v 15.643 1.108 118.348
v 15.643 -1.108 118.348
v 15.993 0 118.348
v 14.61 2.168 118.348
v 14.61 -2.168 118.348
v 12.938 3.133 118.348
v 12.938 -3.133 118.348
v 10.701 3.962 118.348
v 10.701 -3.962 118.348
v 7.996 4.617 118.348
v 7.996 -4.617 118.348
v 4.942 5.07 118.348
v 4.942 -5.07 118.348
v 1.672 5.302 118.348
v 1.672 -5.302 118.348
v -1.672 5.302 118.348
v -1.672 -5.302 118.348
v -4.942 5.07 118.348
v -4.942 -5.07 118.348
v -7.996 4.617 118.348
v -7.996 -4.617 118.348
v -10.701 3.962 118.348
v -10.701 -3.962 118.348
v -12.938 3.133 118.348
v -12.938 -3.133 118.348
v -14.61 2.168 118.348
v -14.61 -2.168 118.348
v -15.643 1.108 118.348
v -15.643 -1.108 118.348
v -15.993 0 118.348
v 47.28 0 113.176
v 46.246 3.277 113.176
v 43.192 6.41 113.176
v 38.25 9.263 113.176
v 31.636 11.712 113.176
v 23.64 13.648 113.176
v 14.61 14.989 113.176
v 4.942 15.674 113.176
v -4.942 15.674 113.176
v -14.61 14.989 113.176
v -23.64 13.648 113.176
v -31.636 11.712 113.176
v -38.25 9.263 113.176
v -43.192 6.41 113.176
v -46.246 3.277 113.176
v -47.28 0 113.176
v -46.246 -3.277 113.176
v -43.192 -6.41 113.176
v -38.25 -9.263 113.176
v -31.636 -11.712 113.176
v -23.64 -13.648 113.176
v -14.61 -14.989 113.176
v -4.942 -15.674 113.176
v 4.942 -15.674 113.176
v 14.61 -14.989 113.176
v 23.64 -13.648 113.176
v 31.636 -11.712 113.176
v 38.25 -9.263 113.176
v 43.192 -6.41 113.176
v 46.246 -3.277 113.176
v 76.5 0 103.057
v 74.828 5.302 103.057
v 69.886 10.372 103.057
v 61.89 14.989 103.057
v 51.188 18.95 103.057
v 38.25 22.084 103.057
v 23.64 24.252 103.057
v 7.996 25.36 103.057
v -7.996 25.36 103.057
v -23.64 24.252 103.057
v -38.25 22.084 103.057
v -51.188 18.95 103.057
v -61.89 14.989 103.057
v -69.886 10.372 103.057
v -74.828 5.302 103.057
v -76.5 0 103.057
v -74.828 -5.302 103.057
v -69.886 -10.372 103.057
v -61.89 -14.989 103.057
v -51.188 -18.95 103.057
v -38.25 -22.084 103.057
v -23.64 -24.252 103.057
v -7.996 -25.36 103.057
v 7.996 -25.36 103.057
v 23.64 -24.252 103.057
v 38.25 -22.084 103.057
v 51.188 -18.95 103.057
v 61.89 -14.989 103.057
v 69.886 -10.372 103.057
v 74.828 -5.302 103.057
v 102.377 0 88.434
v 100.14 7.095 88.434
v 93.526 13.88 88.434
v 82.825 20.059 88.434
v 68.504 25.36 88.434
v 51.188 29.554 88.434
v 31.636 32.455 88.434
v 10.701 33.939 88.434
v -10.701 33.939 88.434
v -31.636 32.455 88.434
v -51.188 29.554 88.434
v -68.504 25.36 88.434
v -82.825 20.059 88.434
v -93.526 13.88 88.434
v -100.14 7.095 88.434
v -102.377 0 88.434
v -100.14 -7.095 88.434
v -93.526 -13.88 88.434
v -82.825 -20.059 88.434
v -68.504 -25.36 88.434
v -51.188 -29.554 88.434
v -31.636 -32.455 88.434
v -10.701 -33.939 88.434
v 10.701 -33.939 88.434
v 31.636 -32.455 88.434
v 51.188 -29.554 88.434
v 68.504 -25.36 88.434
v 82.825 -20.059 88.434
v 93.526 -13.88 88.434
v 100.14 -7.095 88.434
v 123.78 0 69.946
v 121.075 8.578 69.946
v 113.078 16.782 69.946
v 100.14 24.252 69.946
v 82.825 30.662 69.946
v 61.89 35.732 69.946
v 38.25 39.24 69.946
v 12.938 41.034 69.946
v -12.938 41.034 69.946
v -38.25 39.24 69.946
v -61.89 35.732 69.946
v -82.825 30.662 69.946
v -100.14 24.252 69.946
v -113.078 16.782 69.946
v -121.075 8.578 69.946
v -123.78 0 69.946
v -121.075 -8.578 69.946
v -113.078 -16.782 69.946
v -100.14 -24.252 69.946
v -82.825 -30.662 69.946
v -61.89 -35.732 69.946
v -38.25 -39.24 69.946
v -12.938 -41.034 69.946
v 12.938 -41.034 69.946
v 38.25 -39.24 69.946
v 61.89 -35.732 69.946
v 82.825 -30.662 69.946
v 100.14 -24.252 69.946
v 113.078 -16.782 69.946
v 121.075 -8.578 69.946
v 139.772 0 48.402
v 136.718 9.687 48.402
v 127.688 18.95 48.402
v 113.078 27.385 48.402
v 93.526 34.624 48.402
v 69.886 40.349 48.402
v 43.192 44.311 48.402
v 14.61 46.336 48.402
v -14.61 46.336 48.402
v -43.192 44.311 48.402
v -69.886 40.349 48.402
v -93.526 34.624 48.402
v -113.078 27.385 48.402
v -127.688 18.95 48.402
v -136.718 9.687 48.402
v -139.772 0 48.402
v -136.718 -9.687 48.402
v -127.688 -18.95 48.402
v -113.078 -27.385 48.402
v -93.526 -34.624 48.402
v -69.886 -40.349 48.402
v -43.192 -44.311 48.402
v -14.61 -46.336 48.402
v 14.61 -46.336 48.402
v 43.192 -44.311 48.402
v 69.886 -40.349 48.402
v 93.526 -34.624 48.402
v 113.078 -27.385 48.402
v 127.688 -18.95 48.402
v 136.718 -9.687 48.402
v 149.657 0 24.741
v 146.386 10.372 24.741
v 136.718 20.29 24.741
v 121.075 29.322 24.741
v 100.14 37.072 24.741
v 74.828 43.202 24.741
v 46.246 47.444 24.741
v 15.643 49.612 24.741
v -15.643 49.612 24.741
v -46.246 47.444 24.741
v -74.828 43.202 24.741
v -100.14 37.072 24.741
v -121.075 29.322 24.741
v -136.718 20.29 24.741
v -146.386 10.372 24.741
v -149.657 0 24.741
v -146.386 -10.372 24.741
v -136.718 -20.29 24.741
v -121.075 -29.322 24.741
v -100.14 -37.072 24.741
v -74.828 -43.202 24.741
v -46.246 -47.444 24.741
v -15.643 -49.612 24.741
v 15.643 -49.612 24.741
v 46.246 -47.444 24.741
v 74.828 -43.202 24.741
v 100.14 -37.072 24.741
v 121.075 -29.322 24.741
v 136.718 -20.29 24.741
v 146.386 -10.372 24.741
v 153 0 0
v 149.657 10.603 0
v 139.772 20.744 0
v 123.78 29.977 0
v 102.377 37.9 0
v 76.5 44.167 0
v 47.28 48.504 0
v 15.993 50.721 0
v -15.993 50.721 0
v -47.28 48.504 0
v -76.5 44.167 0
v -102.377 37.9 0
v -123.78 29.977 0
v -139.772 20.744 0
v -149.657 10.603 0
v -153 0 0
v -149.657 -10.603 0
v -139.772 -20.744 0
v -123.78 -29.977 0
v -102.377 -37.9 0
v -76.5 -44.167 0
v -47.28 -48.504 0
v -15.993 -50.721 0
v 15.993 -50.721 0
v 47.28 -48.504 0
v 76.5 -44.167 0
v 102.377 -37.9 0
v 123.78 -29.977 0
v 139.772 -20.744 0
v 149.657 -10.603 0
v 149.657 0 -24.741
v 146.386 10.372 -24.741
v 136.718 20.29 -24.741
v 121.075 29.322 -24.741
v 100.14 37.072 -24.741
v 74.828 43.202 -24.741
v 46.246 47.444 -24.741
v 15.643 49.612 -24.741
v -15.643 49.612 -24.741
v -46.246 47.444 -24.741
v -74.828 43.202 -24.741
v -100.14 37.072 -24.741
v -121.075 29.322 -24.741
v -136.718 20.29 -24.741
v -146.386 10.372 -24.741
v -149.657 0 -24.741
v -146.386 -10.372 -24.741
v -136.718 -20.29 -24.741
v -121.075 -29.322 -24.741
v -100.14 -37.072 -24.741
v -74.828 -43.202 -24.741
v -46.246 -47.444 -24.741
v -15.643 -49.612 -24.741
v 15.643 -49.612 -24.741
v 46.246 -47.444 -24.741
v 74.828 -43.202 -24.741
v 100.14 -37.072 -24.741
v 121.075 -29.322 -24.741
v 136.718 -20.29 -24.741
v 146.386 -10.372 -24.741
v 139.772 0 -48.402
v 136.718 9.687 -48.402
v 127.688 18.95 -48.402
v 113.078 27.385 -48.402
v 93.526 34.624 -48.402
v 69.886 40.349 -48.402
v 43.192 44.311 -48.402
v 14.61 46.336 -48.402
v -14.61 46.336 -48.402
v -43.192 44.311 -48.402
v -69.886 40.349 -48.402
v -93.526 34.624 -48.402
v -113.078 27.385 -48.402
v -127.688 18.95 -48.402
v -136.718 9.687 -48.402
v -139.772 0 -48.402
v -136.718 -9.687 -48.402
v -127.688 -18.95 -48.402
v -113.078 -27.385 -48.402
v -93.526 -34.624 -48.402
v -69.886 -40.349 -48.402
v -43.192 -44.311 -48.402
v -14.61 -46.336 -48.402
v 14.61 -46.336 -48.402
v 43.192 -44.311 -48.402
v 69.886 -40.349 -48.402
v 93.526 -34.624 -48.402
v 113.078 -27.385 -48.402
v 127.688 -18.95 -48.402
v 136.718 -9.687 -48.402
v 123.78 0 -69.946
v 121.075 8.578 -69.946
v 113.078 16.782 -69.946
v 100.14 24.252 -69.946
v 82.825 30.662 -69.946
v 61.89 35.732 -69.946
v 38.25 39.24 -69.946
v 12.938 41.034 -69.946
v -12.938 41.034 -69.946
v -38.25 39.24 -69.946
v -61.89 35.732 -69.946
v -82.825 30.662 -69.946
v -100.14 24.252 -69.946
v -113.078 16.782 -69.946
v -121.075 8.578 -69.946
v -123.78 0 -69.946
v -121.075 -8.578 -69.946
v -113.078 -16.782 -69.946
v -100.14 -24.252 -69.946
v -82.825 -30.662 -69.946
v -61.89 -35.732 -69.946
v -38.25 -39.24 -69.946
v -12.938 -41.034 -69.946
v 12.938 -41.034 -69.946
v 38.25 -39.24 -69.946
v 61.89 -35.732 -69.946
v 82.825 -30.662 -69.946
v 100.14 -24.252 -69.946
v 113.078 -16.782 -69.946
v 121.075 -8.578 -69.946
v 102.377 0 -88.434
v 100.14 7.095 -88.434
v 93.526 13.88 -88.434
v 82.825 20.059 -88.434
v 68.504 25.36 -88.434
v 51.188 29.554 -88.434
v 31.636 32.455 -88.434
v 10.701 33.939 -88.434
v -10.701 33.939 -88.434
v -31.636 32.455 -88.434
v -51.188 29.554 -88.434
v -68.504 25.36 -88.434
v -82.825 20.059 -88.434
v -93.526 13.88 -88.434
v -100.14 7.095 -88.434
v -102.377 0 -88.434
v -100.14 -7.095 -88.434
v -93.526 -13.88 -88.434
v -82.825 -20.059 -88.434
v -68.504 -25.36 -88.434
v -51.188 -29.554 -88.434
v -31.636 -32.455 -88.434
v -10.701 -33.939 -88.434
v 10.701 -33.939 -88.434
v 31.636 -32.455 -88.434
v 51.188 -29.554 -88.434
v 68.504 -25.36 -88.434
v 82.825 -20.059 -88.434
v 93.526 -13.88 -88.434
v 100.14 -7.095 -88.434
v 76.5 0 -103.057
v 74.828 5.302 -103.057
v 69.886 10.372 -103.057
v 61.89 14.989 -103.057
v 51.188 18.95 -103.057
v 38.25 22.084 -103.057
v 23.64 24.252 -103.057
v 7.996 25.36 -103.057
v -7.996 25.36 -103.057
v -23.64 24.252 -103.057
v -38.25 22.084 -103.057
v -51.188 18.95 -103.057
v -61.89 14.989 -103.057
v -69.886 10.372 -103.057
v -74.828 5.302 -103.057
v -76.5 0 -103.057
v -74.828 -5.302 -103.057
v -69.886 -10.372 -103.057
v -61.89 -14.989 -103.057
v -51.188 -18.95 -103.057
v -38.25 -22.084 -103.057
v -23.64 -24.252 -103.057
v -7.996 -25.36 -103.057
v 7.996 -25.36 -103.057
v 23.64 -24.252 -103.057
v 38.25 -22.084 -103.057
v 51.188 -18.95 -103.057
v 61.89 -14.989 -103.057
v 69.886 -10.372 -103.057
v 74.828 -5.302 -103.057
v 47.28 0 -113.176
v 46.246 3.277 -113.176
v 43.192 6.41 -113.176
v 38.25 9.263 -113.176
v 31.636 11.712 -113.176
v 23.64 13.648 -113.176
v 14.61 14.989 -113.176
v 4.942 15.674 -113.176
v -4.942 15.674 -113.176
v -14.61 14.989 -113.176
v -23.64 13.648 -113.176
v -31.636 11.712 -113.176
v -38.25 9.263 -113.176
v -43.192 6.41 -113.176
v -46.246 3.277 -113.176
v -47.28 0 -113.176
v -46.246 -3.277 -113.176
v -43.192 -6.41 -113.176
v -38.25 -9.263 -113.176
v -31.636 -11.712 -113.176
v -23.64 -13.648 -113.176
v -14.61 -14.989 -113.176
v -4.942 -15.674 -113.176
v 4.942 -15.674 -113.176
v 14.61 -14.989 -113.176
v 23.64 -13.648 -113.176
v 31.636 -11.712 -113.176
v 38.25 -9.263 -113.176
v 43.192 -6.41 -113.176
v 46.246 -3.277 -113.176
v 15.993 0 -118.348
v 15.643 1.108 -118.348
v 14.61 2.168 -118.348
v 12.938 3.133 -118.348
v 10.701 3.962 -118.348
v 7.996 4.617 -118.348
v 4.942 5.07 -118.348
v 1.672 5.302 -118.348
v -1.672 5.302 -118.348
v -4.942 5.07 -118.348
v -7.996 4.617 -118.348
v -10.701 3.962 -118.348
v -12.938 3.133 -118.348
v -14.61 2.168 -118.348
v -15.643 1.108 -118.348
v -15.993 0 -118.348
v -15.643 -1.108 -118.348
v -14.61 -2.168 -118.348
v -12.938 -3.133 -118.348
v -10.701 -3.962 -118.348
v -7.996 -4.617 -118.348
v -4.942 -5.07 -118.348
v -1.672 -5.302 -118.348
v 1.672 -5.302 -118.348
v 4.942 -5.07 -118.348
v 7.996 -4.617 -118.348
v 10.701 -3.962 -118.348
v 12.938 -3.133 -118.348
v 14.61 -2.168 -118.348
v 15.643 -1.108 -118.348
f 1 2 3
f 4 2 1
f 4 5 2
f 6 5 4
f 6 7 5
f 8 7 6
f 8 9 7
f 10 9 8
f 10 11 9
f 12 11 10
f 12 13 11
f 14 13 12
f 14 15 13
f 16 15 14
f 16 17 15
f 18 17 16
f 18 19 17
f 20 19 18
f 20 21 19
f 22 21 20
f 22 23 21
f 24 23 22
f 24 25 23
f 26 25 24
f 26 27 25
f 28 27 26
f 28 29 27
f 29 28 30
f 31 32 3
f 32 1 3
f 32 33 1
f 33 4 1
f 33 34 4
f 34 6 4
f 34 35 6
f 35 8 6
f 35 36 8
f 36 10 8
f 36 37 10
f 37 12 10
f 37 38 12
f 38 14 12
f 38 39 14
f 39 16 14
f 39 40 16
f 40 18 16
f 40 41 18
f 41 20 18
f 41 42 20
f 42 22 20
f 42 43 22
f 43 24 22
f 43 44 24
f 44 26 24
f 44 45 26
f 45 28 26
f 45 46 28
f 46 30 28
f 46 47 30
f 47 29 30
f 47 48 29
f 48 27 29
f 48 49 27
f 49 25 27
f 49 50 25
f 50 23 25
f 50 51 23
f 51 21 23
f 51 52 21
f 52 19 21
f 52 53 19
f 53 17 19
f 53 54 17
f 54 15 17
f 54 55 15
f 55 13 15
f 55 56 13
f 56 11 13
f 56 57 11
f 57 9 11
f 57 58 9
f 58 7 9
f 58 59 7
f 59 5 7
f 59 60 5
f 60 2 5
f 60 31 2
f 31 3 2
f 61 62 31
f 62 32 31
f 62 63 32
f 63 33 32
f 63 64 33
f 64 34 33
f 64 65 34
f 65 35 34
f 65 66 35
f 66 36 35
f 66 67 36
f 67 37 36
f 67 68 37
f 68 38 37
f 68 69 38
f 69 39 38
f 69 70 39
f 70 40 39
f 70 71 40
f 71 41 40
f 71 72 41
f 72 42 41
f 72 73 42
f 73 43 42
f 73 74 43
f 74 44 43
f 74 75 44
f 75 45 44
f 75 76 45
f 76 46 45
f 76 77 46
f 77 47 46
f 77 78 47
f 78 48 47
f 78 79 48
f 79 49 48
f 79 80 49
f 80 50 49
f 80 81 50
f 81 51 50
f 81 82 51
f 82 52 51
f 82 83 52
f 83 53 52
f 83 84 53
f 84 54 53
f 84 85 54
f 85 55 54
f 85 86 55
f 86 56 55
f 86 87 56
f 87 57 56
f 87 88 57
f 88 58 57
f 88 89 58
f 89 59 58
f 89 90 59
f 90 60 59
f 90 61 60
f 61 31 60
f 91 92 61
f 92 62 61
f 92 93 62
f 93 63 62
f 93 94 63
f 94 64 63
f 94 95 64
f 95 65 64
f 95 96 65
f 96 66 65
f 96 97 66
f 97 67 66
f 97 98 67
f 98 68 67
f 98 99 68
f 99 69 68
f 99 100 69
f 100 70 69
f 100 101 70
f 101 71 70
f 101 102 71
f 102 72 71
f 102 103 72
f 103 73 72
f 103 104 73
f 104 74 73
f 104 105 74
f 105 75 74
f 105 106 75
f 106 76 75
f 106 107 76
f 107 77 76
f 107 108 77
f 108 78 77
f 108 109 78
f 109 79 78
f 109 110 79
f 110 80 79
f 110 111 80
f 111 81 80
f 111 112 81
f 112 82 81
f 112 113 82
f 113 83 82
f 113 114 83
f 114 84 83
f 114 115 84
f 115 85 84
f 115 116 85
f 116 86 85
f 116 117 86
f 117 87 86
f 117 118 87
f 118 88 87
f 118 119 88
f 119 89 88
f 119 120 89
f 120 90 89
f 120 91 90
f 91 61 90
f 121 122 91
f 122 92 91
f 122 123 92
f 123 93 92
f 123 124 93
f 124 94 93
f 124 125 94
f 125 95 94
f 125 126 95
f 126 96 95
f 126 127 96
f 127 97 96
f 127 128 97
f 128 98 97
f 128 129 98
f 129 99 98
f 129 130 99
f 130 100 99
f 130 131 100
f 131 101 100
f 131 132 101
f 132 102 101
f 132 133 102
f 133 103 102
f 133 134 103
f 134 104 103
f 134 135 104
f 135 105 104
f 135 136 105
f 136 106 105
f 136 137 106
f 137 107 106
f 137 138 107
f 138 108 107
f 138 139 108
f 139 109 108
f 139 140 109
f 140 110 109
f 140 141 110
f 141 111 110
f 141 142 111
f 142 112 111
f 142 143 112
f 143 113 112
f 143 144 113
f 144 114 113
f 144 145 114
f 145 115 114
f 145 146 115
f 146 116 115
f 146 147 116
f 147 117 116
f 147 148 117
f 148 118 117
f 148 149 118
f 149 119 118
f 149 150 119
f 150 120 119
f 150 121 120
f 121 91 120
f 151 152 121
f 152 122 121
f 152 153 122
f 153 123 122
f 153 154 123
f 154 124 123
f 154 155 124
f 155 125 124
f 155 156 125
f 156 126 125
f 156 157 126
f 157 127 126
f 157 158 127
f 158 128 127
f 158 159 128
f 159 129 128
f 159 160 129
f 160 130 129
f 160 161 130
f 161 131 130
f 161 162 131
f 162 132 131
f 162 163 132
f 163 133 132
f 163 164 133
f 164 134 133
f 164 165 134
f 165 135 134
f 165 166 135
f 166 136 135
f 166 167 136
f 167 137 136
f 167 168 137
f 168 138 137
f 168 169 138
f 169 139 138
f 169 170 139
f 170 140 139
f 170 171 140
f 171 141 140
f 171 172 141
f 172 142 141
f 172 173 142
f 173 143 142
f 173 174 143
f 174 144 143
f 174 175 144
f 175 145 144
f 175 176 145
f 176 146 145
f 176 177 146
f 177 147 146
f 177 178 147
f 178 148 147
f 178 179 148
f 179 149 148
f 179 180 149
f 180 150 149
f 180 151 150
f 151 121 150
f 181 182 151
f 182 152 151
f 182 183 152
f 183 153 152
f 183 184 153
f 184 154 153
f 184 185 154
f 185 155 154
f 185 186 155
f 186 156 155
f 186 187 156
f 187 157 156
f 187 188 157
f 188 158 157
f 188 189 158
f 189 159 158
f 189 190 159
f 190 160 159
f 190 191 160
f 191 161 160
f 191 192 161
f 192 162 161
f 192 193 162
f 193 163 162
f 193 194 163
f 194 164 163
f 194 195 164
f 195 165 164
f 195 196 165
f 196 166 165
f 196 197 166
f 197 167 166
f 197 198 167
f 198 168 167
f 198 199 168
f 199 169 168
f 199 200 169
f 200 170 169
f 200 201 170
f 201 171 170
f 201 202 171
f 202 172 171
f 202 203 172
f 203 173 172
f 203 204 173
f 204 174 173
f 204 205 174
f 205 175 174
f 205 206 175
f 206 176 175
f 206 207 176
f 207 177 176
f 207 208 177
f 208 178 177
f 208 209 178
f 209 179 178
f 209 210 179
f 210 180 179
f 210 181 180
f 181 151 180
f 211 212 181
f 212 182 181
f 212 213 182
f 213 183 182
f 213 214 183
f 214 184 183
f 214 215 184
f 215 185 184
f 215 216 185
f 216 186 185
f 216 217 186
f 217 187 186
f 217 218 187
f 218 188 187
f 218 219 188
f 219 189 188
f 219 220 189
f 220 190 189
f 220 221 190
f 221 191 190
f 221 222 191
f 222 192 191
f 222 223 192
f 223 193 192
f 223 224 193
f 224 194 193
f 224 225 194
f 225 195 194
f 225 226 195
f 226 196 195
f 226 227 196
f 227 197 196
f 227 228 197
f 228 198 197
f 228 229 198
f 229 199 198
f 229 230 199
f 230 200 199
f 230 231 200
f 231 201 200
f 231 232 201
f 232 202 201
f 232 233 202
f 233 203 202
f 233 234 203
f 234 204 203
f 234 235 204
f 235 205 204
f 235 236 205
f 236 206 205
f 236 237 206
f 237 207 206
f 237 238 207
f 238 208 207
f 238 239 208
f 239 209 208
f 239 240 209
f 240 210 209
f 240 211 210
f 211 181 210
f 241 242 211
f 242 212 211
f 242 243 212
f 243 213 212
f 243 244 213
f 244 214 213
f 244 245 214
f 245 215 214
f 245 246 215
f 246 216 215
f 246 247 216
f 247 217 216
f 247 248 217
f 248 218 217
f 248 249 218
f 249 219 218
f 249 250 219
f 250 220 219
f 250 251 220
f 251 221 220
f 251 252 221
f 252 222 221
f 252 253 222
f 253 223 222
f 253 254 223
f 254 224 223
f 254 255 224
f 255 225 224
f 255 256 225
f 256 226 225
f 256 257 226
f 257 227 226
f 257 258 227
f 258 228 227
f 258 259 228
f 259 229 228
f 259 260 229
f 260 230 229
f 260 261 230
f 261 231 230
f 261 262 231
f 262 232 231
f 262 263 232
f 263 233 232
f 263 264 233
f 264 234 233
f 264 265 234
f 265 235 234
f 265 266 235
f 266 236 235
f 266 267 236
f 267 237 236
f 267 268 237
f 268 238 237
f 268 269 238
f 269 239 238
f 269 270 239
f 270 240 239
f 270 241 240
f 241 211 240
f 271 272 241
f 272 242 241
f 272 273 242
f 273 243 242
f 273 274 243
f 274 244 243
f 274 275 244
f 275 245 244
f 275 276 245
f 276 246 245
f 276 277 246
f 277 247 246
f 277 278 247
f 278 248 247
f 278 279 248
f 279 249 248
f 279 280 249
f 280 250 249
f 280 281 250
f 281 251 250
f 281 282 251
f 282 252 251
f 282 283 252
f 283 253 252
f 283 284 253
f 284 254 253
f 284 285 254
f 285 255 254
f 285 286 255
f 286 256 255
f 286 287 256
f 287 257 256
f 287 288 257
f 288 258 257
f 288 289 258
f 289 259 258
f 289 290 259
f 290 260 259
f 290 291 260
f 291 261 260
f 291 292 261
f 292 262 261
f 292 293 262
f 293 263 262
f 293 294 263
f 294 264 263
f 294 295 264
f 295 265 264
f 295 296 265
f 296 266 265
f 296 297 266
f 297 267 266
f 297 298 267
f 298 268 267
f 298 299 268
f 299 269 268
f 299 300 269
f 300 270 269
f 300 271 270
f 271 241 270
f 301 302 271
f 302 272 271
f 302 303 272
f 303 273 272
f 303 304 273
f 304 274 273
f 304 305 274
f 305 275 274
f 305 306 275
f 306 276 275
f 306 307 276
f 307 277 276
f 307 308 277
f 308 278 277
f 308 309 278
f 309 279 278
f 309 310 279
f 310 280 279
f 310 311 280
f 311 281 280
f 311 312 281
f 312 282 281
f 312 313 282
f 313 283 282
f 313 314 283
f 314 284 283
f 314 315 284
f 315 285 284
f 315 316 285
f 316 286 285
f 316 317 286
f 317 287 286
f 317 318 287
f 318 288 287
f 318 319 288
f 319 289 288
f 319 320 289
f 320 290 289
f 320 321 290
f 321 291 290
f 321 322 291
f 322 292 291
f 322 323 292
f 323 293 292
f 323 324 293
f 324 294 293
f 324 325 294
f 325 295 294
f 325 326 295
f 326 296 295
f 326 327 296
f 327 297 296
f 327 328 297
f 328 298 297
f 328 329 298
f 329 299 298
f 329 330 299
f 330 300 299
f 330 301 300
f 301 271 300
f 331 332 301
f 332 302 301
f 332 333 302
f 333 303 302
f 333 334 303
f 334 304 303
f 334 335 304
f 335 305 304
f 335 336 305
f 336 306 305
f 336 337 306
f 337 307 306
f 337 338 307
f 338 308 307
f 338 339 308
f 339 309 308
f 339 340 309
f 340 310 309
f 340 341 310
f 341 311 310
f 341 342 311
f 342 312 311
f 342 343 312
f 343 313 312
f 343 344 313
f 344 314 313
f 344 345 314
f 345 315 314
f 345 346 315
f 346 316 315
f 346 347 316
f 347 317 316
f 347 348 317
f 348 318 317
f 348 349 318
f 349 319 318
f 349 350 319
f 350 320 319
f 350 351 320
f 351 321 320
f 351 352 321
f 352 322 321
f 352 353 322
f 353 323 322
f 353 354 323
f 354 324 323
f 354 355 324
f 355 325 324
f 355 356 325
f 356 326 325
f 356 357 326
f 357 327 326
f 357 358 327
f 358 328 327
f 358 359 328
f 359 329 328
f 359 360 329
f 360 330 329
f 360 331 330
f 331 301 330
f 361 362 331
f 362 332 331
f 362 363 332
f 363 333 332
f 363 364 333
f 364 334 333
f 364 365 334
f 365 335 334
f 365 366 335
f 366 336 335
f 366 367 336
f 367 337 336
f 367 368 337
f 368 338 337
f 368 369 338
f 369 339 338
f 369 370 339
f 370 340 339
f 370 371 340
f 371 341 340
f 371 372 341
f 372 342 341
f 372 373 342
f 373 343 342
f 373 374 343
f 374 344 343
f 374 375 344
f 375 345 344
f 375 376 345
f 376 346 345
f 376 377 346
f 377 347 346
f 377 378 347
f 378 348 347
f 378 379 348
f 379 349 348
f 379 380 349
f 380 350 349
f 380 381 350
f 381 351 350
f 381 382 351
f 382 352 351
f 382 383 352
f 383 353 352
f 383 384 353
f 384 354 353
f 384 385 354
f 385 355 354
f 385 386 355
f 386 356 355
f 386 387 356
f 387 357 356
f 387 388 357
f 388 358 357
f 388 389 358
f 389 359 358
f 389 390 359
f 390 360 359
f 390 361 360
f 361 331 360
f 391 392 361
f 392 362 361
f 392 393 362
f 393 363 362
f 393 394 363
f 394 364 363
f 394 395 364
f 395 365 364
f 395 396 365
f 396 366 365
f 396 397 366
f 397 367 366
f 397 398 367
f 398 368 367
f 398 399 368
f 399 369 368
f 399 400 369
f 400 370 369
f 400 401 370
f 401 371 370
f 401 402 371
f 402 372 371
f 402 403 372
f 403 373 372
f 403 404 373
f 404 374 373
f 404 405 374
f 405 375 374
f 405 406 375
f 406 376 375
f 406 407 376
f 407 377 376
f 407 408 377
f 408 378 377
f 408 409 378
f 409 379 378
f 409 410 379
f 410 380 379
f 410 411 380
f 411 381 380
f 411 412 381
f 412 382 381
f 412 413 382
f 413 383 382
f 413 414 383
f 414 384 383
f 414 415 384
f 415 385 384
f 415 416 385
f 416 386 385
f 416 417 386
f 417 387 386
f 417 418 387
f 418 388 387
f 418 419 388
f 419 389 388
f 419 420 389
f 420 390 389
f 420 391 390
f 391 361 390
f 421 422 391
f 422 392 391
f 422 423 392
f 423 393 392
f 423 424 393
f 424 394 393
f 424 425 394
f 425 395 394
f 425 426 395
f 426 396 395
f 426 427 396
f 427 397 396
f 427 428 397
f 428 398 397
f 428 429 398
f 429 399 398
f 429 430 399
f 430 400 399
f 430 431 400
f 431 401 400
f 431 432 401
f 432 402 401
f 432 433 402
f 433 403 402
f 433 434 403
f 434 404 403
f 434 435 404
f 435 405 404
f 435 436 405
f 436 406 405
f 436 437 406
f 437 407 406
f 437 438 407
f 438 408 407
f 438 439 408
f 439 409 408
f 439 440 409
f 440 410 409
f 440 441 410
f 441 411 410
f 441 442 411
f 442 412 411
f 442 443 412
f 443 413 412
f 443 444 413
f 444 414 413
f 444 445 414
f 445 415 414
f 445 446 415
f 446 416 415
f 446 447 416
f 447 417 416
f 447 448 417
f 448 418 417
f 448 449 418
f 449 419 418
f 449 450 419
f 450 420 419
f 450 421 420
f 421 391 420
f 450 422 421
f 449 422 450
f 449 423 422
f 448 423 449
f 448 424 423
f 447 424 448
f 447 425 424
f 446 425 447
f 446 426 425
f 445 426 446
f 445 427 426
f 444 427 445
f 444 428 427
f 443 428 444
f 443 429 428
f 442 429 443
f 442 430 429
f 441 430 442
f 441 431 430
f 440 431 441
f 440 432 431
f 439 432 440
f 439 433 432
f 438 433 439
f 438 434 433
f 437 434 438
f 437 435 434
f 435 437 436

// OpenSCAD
// Generated by SolidPython 1.0.1 on 2020-07-29 00:46:48


scale(v = [9, 3, 7]) {
	sphere(r = 17);
}
/***********************************************
*********      SolidPython code:      **********
************************************************
 
# import packages: SolidPython
from solid import *
from solid.utils import *
from itertools import chain, combinations, permutations


class Resize:

    def __init__(self, scad_file):
        self.scad_file = scad_file
        #self.scad_file = import_scad(scad_file)
        # cone/cylinder param:
        self.r1 = 0
        self.r2 = 0
        self.h = 0
        # rectangular prism param:
        self.w = 0
        self.l = 0
        # ellipse param:
        self.r = 0

    # import OpenScad code (file name corresponds to shape)


    # classify shape + parameters
    def assign(self, param1, param2, param3):
        if self.scad_file == 'cone.scad':
            self.r1 = param1
            self.r2 = param2
            self.h = param3
        elif self.scad_file == 'cylinder.scad':
            self.r1 = param1
            self.r2 = param2
            self.h = param3
        elif self.scad_file == 'rectangularPrism.scad':
            self.h = param1
            self.l = param2
            self.w = param3
        else:
            self.r = param1
            self.h = param2

    # resize parameters
    def iterate(self):
        x = range(3, 20, 2)
        i = 1
        if self.scad_file == 'cone.scad':
            tempList = list(permutations(x, 2))
            for temp in tempList:
                param1 = temp[0]
                param2 = temp[1]
                filepath = 'produced_scad_files/' + 'cone' + str(param1) + '_' + str(param2) + '_' + '.scad'
                scad_render_to_file(cylinder(h=param1, r1=param2, r2=0), filepath)

        elif self.scad_file == 'cylinder.scad':
            tempList = list(permutations(x, 3))
            for temp in tempList:
                param1 = temp[0]
                param2 = temp[1]
                filepath = 'produced_scad_files/' + 'cylinder' + str(param1) + '_' + str(param2) + '_' + '.scad'
                scad_render_to_file(cylinder(h=param1, r1=param2, r2=param2), filepath)

        elif self.scad_file == 'rectangularPrism.scad':
            tempList = list(permutations(x, 3))
            for temp in tempList:
                param1 = temp[0]
                param2 = temp[1]
                param3 = temp[2]
                filepath = 'produced_scad_files/' + 'rectangularPrism' + str(param1) + '_' + str(param2) + '_' + str(
                    param3) + '.scad'
                scad_render_to_file(cube(size=(param1, param2, param3)), filepath)

        elif self.scad_file == 'ellipse.scad':
            tempList = list(permutations(x, 4))
            for temp in tempList:
                param1 = temp[0]
                param2 = temp[1]
                param3 = temp[2]
                param4 = temp[3]
                filepath = 'produced_scad_files/' + 'ellipse' + str(param1) + '_' + str(param2) + '_' + str(param3) + '_' + str(param4) + '.scad'
                scad_render_to_file(scale([param1, param2, param3])(sphere(r=param4)), filepath)

    def render_to_scadfile(self):
        scad_render_to_file(scad, 'example.scad') 
 
************************************************/
